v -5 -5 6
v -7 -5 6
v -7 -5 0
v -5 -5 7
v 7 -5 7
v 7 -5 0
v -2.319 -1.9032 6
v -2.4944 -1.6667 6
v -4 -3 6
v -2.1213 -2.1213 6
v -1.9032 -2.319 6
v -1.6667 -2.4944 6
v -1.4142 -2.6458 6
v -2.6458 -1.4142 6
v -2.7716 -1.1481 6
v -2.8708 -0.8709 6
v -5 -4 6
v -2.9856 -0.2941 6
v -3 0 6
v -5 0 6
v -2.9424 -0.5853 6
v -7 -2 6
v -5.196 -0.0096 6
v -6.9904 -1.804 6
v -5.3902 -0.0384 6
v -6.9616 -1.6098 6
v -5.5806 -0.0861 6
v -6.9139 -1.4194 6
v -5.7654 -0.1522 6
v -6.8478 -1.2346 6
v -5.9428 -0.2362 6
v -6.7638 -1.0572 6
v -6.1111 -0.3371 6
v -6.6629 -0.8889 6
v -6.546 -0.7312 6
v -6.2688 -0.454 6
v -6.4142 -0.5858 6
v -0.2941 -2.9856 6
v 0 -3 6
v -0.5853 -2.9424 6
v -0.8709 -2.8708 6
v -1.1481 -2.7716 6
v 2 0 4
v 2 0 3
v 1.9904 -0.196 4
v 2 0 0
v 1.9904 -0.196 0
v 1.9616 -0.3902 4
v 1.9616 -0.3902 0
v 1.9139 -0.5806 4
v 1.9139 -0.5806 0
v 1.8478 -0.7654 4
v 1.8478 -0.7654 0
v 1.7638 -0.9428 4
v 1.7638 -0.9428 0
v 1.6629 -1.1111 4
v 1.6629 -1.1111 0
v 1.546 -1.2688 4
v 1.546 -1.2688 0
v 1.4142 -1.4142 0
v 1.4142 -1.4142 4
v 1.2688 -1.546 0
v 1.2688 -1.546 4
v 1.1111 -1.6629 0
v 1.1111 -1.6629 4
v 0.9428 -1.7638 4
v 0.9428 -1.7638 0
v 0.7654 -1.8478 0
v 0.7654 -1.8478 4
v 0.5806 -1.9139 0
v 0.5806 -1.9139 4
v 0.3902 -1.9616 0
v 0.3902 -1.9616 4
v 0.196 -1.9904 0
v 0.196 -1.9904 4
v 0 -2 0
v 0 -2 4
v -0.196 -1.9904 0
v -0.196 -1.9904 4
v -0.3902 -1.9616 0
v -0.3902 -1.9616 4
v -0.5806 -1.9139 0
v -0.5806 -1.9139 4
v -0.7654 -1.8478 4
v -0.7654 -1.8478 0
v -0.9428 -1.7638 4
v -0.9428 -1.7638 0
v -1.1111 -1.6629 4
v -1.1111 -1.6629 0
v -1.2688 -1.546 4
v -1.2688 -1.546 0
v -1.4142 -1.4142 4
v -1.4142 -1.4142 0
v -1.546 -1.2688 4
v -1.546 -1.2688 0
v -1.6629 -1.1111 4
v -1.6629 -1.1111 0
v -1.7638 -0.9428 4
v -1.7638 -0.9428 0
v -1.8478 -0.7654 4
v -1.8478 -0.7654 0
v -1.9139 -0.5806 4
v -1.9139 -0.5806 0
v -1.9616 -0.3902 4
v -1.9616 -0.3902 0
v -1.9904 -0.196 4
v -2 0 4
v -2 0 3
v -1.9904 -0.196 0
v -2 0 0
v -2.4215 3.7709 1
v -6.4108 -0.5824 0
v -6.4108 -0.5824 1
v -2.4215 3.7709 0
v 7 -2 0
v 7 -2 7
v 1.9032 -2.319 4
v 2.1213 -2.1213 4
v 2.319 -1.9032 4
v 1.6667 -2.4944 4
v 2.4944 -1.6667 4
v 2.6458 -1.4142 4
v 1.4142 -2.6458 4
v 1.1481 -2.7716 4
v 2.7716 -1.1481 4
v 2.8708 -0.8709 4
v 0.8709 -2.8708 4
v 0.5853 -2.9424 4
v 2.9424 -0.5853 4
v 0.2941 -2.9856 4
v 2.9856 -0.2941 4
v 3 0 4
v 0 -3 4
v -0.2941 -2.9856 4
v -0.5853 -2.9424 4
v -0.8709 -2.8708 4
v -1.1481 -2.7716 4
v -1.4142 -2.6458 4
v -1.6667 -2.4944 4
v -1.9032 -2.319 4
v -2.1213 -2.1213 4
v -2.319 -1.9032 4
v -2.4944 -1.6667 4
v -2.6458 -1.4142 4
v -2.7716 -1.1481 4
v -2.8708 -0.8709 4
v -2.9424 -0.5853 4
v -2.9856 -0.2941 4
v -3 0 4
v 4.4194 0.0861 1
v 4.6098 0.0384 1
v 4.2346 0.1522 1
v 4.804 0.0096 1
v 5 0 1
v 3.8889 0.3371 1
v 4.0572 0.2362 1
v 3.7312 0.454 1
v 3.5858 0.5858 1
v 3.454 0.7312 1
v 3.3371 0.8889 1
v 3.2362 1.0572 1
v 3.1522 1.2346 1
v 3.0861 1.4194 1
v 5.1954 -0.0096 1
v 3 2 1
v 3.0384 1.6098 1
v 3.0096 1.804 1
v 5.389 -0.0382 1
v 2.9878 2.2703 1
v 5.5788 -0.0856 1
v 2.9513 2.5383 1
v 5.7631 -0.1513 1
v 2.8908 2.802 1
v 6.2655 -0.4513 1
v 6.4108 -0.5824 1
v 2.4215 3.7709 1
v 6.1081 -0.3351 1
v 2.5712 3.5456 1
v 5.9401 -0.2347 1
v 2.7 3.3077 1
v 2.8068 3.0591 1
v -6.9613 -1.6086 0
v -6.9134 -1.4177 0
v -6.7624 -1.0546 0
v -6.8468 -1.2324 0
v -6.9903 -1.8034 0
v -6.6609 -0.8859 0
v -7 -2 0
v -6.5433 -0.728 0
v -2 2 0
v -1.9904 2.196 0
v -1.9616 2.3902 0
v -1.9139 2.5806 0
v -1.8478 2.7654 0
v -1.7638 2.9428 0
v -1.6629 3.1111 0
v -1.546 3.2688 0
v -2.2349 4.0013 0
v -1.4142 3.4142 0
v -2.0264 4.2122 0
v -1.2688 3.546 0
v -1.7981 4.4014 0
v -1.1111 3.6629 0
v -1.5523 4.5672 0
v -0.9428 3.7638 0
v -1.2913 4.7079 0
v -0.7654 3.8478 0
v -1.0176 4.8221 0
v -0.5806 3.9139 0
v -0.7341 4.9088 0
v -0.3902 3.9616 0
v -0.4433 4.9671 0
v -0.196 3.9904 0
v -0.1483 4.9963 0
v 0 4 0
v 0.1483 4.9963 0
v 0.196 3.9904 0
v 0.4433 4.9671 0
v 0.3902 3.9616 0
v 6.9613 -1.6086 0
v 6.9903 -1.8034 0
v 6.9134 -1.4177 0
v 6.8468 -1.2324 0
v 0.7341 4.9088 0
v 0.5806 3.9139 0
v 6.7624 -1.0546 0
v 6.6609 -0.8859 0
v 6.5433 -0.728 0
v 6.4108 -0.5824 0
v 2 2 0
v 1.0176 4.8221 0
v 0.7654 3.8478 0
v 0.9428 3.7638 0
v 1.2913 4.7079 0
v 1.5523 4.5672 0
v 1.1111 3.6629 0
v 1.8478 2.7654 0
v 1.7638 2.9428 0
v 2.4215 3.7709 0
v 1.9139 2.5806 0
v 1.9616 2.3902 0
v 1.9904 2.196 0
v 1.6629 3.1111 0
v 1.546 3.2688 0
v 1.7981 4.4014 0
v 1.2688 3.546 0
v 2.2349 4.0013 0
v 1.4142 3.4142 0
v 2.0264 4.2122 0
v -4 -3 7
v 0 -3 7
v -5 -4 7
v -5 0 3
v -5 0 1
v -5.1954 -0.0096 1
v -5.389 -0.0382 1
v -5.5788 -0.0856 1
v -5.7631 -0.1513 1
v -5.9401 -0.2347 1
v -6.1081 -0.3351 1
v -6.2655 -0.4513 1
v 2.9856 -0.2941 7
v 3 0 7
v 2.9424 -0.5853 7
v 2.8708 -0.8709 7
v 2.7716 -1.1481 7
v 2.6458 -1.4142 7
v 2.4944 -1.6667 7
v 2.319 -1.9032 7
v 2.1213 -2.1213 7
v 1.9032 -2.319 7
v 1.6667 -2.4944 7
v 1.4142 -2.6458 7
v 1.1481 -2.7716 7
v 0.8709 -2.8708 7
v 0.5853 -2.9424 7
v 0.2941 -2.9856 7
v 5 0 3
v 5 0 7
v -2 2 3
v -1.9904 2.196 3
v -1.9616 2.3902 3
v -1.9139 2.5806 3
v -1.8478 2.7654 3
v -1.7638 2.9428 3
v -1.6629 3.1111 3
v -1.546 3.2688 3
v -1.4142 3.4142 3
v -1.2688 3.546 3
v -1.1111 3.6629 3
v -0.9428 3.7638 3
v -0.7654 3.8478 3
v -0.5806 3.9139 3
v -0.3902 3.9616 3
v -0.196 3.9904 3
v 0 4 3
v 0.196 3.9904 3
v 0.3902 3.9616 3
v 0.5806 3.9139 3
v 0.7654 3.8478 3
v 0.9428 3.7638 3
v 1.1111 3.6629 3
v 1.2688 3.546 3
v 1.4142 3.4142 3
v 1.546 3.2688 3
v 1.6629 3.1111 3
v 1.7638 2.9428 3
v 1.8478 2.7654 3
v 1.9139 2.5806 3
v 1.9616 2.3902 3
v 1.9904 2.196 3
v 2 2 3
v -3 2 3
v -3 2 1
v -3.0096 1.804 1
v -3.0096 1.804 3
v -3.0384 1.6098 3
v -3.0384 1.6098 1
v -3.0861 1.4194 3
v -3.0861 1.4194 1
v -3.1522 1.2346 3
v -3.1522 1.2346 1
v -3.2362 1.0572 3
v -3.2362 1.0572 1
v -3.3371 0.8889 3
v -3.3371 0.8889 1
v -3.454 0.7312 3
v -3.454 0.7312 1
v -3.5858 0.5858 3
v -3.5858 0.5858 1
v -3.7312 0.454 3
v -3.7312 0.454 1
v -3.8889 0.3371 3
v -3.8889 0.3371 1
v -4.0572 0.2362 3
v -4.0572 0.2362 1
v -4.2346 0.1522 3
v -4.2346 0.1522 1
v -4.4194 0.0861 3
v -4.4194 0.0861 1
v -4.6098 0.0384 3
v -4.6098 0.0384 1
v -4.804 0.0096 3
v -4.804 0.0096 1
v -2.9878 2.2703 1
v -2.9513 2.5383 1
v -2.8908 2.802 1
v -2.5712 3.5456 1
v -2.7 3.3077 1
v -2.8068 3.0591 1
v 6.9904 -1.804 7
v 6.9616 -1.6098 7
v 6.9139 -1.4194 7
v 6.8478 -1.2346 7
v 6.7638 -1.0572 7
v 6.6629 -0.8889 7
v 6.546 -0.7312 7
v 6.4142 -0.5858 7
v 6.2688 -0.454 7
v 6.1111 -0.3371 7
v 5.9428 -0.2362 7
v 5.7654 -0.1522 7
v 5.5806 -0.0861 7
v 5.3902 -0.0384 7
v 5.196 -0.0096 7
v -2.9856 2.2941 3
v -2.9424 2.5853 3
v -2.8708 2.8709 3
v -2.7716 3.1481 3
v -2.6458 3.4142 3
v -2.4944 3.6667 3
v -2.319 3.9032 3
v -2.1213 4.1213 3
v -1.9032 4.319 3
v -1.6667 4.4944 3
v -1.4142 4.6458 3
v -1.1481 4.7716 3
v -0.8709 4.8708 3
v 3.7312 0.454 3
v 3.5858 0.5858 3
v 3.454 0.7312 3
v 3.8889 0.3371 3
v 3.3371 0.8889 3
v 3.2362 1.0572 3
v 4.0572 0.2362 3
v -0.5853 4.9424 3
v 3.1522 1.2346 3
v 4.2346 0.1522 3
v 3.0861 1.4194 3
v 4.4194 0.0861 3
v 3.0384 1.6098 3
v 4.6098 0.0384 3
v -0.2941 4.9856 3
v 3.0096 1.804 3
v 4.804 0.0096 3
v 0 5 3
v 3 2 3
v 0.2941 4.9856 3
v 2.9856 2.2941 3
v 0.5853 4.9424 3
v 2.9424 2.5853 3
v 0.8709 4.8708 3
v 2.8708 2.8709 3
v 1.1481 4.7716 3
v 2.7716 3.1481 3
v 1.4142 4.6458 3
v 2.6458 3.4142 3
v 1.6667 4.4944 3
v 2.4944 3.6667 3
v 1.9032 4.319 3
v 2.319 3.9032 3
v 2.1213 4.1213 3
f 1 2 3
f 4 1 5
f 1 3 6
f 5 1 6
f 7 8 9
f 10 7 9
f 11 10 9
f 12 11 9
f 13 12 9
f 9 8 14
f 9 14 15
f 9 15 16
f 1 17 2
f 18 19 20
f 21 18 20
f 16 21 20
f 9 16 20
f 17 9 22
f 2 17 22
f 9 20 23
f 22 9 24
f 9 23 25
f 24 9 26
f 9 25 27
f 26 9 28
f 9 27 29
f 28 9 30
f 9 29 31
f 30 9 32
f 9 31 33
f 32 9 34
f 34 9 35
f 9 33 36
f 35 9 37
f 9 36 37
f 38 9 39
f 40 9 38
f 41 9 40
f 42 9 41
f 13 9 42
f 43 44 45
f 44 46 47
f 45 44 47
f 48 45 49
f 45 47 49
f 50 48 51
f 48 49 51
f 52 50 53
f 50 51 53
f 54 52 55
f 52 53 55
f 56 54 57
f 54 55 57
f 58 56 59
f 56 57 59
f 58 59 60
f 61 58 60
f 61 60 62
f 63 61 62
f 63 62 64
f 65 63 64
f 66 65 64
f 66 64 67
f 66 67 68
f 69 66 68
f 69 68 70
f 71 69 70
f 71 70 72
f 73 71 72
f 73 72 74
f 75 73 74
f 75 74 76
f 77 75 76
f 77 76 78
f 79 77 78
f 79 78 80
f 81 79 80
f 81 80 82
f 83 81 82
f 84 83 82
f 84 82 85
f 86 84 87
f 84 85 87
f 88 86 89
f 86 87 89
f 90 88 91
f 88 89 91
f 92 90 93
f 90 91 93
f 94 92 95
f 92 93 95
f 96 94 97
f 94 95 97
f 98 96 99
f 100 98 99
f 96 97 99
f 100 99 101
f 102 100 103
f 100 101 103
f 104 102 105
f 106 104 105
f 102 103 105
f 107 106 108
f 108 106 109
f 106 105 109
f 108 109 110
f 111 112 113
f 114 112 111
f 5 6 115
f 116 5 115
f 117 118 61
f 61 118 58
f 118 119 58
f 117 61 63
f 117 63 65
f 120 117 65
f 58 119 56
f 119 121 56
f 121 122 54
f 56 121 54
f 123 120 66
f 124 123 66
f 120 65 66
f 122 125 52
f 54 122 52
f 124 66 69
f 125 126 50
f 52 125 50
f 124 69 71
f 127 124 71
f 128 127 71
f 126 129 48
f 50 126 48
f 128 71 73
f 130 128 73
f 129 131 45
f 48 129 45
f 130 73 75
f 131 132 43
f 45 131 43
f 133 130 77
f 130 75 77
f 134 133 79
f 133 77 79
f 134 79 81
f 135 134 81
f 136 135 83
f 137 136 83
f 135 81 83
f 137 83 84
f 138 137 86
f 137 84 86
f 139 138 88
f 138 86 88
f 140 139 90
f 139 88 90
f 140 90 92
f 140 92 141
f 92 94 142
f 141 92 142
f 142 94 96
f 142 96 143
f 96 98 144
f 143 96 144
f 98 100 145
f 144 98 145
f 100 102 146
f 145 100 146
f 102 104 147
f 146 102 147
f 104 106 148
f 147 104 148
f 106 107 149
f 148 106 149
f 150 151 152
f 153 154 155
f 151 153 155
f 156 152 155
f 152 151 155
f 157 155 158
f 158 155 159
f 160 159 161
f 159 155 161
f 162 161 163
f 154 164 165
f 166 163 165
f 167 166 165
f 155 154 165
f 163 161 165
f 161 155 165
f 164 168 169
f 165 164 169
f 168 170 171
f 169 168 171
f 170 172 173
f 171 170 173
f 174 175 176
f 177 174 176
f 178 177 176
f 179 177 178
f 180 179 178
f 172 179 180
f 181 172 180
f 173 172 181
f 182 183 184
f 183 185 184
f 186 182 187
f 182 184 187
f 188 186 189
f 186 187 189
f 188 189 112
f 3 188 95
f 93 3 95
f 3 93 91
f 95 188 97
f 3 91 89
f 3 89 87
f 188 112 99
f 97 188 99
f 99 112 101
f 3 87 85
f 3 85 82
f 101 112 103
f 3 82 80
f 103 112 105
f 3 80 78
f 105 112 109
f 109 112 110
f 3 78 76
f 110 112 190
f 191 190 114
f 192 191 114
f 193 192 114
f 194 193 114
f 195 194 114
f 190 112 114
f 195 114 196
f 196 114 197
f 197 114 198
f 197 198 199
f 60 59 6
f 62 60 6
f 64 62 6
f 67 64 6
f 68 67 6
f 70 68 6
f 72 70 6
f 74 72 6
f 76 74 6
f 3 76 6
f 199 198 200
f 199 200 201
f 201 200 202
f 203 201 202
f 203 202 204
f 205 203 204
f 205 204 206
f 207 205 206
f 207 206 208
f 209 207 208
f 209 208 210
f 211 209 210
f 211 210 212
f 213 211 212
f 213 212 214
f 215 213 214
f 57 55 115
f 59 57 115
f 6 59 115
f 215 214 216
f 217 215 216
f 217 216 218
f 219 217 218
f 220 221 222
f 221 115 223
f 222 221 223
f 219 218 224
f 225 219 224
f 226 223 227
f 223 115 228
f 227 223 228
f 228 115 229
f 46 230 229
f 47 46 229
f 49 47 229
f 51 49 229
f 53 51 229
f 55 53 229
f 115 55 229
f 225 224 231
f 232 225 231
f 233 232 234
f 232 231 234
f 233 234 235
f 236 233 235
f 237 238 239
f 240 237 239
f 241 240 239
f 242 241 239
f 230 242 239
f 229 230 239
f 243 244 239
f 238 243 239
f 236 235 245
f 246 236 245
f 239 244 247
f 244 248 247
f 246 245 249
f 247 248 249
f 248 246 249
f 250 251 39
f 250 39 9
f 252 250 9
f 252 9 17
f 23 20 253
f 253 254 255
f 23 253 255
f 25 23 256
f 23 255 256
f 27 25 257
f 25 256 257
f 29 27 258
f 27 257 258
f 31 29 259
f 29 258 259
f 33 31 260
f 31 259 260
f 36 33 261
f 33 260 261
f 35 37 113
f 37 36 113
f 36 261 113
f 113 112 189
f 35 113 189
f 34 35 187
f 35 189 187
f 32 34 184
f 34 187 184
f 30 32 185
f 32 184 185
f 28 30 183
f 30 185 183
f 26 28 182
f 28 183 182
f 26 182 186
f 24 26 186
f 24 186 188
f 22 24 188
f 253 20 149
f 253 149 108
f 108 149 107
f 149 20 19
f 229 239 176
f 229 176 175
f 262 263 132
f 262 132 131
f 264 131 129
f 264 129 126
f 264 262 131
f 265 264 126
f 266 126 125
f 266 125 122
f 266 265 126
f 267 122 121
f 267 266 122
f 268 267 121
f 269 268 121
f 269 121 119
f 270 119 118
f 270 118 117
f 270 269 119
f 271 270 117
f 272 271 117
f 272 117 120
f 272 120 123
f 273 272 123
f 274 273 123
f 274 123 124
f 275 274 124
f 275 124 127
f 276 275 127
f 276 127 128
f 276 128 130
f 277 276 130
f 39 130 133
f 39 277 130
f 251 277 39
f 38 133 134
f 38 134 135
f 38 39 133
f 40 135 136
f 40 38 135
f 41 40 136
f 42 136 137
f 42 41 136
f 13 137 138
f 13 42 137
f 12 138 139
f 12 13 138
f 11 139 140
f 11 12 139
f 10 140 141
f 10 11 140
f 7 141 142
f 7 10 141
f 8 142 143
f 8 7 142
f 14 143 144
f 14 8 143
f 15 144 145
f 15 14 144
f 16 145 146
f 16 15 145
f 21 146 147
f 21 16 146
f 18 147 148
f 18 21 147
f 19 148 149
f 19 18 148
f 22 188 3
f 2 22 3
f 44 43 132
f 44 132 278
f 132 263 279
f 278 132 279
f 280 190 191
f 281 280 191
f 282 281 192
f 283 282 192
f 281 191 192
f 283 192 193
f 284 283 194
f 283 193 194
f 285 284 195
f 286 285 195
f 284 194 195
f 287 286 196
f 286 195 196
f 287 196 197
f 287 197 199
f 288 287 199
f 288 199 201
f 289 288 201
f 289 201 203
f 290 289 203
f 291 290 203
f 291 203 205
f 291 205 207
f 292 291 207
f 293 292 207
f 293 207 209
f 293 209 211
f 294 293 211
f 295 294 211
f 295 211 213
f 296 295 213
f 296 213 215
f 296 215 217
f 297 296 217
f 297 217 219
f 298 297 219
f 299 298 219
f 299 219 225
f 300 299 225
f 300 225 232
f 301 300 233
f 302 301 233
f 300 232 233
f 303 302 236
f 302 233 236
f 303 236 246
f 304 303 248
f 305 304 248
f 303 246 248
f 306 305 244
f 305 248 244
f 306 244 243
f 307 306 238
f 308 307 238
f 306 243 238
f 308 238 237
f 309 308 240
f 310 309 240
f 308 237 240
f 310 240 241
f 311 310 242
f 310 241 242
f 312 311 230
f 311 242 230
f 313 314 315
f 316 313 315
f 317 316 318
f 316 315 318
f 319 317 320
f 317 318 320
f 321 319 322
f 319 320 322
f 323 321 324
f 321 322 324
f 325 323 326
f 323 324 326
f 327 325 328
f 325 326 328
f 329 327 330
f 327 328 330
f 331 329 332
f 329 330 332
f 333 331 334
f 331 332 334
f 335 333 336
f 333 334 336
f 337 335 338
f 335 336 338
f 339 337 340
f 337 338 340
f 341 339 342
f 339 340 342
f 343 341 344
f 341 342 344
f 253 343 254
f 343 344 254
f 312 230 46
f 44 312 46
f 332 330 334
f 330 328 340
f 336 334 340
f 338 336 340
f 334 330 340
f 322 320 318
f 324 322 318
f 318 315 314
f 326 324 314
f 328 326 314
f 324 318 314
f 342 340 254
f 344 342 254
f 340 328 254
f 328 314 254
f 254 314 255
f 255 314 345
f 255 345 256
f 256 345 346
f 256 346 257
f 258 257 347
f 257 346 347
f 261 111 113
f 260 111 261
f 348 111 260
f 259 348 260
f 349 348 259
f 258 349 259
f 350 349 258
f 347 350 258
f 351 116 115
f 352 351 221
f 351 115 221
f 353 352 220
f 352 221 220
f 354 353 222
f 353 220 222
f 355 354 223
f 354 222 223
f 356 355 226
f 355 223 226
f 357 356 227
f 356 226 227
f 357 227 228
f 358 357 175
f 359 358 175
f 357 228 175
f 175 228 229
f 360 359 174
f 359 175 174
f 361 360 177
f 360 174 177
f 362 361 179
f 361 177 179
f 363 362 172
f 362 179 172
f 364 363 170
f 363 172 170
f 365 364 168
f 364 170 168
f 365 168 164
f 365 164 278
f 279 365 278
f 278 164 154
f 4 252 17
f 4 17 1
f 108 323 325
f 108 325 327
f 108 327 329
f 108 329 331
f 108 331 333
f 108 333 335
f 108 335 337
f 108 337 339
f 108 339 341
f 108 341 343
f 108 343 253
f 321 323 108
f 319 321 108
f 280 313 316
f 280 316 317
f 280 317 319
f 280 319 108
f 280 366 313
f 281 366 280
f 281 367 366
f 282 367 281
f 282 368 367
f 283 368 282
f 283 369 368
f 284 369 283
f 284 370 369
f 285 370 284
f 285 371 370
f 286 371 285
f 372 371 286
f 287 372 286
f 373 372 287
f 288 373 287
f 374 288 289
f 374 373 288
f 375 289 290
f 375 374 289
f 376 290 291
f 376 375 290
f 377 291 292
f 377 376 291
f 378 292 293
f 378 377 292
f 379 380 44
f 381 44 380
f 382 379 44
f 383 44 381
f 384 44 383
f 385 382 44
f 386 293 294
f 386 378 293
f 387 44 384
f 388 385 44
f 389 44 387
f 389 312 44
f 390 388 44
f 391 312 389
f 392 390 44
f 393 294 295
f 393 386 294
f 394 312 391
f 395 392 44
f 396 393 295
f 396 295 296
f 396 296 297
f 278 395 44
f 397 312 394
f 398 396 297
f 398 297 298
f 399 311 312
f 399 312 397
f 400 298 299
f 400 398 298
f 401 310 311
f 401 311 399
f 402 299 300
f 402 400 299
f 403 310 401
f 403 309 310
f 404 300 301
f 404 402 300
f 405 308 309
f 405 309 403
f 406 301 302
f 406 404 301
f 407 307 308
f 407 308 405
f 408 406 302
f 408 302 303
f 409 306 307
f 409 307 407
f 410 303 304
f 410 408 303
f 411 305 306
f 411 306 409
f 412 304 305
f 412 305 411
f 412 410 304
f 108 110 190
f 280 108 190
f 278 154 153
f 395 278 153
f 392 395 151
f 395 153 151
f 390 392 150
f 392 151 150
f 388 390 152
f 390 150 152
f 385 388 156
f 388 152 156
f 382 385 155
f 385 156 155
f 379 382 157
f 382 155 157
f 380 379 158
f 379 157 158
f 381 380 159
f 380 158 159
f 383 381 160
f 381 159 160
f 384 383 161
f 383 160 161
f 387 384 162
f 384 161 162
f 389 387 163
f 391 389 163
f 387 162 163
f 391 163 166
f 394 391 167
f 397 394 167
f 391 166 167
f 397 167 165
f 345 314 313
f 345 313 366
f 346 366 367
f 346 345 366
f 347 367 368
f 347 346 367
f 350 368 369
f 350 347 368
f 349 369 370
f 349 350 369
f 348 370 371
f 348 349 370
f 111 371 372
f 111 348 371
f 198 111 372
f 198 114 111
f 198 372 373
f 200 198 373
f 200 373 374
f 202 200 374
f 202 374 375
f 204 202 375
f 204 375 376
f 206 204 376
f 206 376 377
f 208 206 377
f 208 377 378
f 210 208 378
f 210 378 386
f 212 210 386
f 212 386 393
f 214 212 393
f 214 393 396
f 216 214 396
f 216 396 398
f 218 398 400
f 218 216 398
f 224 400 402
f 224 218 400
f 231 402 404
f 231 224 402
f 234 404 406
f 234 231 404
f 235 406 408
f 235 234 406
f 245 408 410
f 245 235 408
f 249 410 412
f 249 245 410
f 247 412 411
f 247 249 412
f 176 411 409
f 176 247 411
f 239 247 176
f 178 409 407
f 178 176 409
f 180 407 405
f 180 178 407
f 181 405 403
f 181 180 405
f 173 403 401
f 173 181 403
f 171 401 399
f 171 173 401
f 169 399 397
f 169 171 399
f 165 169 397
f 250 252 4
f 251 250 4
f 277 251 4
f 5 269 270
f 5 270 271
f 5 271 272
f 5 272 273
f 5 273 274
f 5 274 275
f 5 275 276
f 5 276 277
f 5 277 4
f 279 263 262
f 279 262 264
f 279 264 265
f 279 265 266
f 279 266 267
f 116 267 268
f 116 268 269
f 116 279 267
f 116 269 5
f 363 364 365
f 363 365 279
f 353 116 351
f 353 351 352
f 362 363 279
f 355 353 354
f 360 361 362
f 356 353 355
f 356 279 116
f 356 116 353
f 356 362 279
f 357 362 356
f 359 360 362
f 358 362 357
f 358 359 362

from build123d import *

# Parameters (mm, degrees)
BOSS_EXTRUDE1_DEPTH = 7
BOSS_EXTRUDE2_DEPTH = 1
SKETCH3_W           = 10.974831657
SKETCH3_H           = 5.618667726
CUT_EXTRUDE1_DEPTH  = 4
CUT_EXTRUDE2_DEPTH  = 3
CUT_EXTRUDE3_DEPTH  = 1


with BuildPart() as part:
    # Sketch1 → Boss-Extrude1 (new body)
    with BuildSketch(Plane.XY):
        with BuildLine():
            Line((-7, -2), (-7, -5))
            Line((-7, -5), (7, -5))
            Line((7, -5), (7, -2))
            ThreePointArc((7, -2), (6.414213562, -0.585786438), (5, 0))
            ThreePointArc((5, 0), (3.585786438, 0.585786438), (3, 2))
            ThreePointArc((3, 2), (0, 5), (-3, 2))
            ThreePointArc((-3, 2), (-3.585786438, 0.585786438), (-5, 0))
            ThreePointArc((-5, 0), (-6.414213562, -0.585786438), (-7, -2))
        make_face()
        with BuildLine():
            Line((-2, 0), (-2, 2))
            ThreePointArc((-2, 2), (0, 4), (2, 2))
            Line((2, 2), (2, 0))
            ThreePointArc((2, 0), (0, -2), (-2, 0))
        make_face(mode=Mode.SUBTRACT)
    extrude(amount=BOSS_EXTRUDE1_DEPTH)

    # Sketch2 → Boss-Extrude2 (add)
    with BuildSketch(Plane(origin=(0, 0, 0), x_dir=(-1, 0, 0), z_dir=(0, 0, -1))):
        with BuildLine():
            ThreePointArc((7, -2), (6.880189856, -1.318174432), (6.535113895, -0.718038484))
            Line((6.535113895, -0.718038484), (6.410807281, -0.582388341))
            ThreePointArc((6.410807281, -0.582388341), (5.763143722, -0.151321645), (5, 0))
            ThreePointArc((5, 0), (3.585786438, 0.585786438), (3, 2))
            ThreePointArc((3, 2), (2.851719503, 2.931501945), (2.421536084, 3.77092151))
            ThreePointArc((2.421536084, 3.77092151), (0, 5), (-2.421536084, 3.77092151))
            ThreePointArc((-2.421536084, 3.77092151), (-2.851719503, 2.931501945), (-3, 2))
            ThreePointArc((-3, 2), (-3.585786438, 0.585786438), (-5, 0))
            ThreePointArc((-5, 0), (-5.763143722, -0.151321645), (-6.410807281, -0.582388341))
            Line((-6.410807281, -0.582388341), (-6.535113895, -0.718038484))
            ThreePointArc((-6.535113895, -0.718038484), (-6.880189856, -1.318174432), (-7, -2))
            Line((-7, -2), (-7, -5))
            Line((-7, -5), (7, -5))
            Line((7, -5), (7, -2))
        make_face()
        with BuildLine():
            ThreePointArc((2, 0), (0, -2), (-2, 0))
            Line((-2, 0), (-2, 2))
            ThreePointArc((-2, 2), (0, 4), (2, 2))
            Line((2, 2), (2, 0))
        make_face(mode=Mode.SUBTRACT)
        with BuildLine():
            ThreePointArc((5, 0), (5.763143722, -0.151321645), (6.410807281, -0.582388341))
            Line((6.410807281, -0.582388341), (2.421536084, 3.77092151))
            ThreePointArc((2.421536084, 3.77092151), (2.851719503, 2.931501945), (3, 2))
            ThreePointArc((3, 2), (3.585786438, 0.585786438), (5, 0))
        make_face()
        with BuildLine():
            ThreePointArc((-3, 2), (-2.851719503, 2.931501945), (-2.421536084, 3.77092151))
            Line((-2.421536084, 3.77092151), (-6.410807281, -0.582388341))
            ThreePointArc((-6.410807281, -0.582388341), (-5.763143722, -0.151321645), (-5, 0))
            ThreePointArc((-5, 0), (-3.585786438, 0.585786438), (-3, 2))
        make_face()
    extrude(amount=-BOSS_EXTRUDE2_DEPTH)

    # Sketch3 → Cut-Extrude1 (cut)
    with BuildSketch(Plane.XY.offset(7)):
        with Locations((0.487415829, 2.809333863)):
            Rectangle(SKETCH3_W, SKETCH3_H)
    extrude(amount=-CUT_EXTRUDE1_DEPTH, mode=Mode.SUBTRACT)

    # Sketch4 → Cut-Extrude2 (cut)
    with BuildSketch(Plane.XY.offset(7)):
        with BuildLine():
            Line((3, 2), (3, 0))
            ThreePointArc((3, 0), (0, -3), (-3, 0))
            Line((-3, 0), (-3, 2))
            ThreePointArc((-3, 2), (0, 5), (3, 2))
        make_face()
    extrude(amount=-CUT_EXTRUDE2_DEPTH, mode=Mode.SUBTRACT)

    # Sketch5 → Cut-Extrude3 (cut)
    with BuildSketch(Plane.XY.offset(7)):
        Polygon((0, -3), (-4, -3), (-5, -4), (-5, -5), (-7, -5), (-7, 0), (0, 0), align=None)
    extrude(amount=-CUT_EXTRUDE3_DEPTH, mode=Mode.SUBTRACT)


solid = part.part
